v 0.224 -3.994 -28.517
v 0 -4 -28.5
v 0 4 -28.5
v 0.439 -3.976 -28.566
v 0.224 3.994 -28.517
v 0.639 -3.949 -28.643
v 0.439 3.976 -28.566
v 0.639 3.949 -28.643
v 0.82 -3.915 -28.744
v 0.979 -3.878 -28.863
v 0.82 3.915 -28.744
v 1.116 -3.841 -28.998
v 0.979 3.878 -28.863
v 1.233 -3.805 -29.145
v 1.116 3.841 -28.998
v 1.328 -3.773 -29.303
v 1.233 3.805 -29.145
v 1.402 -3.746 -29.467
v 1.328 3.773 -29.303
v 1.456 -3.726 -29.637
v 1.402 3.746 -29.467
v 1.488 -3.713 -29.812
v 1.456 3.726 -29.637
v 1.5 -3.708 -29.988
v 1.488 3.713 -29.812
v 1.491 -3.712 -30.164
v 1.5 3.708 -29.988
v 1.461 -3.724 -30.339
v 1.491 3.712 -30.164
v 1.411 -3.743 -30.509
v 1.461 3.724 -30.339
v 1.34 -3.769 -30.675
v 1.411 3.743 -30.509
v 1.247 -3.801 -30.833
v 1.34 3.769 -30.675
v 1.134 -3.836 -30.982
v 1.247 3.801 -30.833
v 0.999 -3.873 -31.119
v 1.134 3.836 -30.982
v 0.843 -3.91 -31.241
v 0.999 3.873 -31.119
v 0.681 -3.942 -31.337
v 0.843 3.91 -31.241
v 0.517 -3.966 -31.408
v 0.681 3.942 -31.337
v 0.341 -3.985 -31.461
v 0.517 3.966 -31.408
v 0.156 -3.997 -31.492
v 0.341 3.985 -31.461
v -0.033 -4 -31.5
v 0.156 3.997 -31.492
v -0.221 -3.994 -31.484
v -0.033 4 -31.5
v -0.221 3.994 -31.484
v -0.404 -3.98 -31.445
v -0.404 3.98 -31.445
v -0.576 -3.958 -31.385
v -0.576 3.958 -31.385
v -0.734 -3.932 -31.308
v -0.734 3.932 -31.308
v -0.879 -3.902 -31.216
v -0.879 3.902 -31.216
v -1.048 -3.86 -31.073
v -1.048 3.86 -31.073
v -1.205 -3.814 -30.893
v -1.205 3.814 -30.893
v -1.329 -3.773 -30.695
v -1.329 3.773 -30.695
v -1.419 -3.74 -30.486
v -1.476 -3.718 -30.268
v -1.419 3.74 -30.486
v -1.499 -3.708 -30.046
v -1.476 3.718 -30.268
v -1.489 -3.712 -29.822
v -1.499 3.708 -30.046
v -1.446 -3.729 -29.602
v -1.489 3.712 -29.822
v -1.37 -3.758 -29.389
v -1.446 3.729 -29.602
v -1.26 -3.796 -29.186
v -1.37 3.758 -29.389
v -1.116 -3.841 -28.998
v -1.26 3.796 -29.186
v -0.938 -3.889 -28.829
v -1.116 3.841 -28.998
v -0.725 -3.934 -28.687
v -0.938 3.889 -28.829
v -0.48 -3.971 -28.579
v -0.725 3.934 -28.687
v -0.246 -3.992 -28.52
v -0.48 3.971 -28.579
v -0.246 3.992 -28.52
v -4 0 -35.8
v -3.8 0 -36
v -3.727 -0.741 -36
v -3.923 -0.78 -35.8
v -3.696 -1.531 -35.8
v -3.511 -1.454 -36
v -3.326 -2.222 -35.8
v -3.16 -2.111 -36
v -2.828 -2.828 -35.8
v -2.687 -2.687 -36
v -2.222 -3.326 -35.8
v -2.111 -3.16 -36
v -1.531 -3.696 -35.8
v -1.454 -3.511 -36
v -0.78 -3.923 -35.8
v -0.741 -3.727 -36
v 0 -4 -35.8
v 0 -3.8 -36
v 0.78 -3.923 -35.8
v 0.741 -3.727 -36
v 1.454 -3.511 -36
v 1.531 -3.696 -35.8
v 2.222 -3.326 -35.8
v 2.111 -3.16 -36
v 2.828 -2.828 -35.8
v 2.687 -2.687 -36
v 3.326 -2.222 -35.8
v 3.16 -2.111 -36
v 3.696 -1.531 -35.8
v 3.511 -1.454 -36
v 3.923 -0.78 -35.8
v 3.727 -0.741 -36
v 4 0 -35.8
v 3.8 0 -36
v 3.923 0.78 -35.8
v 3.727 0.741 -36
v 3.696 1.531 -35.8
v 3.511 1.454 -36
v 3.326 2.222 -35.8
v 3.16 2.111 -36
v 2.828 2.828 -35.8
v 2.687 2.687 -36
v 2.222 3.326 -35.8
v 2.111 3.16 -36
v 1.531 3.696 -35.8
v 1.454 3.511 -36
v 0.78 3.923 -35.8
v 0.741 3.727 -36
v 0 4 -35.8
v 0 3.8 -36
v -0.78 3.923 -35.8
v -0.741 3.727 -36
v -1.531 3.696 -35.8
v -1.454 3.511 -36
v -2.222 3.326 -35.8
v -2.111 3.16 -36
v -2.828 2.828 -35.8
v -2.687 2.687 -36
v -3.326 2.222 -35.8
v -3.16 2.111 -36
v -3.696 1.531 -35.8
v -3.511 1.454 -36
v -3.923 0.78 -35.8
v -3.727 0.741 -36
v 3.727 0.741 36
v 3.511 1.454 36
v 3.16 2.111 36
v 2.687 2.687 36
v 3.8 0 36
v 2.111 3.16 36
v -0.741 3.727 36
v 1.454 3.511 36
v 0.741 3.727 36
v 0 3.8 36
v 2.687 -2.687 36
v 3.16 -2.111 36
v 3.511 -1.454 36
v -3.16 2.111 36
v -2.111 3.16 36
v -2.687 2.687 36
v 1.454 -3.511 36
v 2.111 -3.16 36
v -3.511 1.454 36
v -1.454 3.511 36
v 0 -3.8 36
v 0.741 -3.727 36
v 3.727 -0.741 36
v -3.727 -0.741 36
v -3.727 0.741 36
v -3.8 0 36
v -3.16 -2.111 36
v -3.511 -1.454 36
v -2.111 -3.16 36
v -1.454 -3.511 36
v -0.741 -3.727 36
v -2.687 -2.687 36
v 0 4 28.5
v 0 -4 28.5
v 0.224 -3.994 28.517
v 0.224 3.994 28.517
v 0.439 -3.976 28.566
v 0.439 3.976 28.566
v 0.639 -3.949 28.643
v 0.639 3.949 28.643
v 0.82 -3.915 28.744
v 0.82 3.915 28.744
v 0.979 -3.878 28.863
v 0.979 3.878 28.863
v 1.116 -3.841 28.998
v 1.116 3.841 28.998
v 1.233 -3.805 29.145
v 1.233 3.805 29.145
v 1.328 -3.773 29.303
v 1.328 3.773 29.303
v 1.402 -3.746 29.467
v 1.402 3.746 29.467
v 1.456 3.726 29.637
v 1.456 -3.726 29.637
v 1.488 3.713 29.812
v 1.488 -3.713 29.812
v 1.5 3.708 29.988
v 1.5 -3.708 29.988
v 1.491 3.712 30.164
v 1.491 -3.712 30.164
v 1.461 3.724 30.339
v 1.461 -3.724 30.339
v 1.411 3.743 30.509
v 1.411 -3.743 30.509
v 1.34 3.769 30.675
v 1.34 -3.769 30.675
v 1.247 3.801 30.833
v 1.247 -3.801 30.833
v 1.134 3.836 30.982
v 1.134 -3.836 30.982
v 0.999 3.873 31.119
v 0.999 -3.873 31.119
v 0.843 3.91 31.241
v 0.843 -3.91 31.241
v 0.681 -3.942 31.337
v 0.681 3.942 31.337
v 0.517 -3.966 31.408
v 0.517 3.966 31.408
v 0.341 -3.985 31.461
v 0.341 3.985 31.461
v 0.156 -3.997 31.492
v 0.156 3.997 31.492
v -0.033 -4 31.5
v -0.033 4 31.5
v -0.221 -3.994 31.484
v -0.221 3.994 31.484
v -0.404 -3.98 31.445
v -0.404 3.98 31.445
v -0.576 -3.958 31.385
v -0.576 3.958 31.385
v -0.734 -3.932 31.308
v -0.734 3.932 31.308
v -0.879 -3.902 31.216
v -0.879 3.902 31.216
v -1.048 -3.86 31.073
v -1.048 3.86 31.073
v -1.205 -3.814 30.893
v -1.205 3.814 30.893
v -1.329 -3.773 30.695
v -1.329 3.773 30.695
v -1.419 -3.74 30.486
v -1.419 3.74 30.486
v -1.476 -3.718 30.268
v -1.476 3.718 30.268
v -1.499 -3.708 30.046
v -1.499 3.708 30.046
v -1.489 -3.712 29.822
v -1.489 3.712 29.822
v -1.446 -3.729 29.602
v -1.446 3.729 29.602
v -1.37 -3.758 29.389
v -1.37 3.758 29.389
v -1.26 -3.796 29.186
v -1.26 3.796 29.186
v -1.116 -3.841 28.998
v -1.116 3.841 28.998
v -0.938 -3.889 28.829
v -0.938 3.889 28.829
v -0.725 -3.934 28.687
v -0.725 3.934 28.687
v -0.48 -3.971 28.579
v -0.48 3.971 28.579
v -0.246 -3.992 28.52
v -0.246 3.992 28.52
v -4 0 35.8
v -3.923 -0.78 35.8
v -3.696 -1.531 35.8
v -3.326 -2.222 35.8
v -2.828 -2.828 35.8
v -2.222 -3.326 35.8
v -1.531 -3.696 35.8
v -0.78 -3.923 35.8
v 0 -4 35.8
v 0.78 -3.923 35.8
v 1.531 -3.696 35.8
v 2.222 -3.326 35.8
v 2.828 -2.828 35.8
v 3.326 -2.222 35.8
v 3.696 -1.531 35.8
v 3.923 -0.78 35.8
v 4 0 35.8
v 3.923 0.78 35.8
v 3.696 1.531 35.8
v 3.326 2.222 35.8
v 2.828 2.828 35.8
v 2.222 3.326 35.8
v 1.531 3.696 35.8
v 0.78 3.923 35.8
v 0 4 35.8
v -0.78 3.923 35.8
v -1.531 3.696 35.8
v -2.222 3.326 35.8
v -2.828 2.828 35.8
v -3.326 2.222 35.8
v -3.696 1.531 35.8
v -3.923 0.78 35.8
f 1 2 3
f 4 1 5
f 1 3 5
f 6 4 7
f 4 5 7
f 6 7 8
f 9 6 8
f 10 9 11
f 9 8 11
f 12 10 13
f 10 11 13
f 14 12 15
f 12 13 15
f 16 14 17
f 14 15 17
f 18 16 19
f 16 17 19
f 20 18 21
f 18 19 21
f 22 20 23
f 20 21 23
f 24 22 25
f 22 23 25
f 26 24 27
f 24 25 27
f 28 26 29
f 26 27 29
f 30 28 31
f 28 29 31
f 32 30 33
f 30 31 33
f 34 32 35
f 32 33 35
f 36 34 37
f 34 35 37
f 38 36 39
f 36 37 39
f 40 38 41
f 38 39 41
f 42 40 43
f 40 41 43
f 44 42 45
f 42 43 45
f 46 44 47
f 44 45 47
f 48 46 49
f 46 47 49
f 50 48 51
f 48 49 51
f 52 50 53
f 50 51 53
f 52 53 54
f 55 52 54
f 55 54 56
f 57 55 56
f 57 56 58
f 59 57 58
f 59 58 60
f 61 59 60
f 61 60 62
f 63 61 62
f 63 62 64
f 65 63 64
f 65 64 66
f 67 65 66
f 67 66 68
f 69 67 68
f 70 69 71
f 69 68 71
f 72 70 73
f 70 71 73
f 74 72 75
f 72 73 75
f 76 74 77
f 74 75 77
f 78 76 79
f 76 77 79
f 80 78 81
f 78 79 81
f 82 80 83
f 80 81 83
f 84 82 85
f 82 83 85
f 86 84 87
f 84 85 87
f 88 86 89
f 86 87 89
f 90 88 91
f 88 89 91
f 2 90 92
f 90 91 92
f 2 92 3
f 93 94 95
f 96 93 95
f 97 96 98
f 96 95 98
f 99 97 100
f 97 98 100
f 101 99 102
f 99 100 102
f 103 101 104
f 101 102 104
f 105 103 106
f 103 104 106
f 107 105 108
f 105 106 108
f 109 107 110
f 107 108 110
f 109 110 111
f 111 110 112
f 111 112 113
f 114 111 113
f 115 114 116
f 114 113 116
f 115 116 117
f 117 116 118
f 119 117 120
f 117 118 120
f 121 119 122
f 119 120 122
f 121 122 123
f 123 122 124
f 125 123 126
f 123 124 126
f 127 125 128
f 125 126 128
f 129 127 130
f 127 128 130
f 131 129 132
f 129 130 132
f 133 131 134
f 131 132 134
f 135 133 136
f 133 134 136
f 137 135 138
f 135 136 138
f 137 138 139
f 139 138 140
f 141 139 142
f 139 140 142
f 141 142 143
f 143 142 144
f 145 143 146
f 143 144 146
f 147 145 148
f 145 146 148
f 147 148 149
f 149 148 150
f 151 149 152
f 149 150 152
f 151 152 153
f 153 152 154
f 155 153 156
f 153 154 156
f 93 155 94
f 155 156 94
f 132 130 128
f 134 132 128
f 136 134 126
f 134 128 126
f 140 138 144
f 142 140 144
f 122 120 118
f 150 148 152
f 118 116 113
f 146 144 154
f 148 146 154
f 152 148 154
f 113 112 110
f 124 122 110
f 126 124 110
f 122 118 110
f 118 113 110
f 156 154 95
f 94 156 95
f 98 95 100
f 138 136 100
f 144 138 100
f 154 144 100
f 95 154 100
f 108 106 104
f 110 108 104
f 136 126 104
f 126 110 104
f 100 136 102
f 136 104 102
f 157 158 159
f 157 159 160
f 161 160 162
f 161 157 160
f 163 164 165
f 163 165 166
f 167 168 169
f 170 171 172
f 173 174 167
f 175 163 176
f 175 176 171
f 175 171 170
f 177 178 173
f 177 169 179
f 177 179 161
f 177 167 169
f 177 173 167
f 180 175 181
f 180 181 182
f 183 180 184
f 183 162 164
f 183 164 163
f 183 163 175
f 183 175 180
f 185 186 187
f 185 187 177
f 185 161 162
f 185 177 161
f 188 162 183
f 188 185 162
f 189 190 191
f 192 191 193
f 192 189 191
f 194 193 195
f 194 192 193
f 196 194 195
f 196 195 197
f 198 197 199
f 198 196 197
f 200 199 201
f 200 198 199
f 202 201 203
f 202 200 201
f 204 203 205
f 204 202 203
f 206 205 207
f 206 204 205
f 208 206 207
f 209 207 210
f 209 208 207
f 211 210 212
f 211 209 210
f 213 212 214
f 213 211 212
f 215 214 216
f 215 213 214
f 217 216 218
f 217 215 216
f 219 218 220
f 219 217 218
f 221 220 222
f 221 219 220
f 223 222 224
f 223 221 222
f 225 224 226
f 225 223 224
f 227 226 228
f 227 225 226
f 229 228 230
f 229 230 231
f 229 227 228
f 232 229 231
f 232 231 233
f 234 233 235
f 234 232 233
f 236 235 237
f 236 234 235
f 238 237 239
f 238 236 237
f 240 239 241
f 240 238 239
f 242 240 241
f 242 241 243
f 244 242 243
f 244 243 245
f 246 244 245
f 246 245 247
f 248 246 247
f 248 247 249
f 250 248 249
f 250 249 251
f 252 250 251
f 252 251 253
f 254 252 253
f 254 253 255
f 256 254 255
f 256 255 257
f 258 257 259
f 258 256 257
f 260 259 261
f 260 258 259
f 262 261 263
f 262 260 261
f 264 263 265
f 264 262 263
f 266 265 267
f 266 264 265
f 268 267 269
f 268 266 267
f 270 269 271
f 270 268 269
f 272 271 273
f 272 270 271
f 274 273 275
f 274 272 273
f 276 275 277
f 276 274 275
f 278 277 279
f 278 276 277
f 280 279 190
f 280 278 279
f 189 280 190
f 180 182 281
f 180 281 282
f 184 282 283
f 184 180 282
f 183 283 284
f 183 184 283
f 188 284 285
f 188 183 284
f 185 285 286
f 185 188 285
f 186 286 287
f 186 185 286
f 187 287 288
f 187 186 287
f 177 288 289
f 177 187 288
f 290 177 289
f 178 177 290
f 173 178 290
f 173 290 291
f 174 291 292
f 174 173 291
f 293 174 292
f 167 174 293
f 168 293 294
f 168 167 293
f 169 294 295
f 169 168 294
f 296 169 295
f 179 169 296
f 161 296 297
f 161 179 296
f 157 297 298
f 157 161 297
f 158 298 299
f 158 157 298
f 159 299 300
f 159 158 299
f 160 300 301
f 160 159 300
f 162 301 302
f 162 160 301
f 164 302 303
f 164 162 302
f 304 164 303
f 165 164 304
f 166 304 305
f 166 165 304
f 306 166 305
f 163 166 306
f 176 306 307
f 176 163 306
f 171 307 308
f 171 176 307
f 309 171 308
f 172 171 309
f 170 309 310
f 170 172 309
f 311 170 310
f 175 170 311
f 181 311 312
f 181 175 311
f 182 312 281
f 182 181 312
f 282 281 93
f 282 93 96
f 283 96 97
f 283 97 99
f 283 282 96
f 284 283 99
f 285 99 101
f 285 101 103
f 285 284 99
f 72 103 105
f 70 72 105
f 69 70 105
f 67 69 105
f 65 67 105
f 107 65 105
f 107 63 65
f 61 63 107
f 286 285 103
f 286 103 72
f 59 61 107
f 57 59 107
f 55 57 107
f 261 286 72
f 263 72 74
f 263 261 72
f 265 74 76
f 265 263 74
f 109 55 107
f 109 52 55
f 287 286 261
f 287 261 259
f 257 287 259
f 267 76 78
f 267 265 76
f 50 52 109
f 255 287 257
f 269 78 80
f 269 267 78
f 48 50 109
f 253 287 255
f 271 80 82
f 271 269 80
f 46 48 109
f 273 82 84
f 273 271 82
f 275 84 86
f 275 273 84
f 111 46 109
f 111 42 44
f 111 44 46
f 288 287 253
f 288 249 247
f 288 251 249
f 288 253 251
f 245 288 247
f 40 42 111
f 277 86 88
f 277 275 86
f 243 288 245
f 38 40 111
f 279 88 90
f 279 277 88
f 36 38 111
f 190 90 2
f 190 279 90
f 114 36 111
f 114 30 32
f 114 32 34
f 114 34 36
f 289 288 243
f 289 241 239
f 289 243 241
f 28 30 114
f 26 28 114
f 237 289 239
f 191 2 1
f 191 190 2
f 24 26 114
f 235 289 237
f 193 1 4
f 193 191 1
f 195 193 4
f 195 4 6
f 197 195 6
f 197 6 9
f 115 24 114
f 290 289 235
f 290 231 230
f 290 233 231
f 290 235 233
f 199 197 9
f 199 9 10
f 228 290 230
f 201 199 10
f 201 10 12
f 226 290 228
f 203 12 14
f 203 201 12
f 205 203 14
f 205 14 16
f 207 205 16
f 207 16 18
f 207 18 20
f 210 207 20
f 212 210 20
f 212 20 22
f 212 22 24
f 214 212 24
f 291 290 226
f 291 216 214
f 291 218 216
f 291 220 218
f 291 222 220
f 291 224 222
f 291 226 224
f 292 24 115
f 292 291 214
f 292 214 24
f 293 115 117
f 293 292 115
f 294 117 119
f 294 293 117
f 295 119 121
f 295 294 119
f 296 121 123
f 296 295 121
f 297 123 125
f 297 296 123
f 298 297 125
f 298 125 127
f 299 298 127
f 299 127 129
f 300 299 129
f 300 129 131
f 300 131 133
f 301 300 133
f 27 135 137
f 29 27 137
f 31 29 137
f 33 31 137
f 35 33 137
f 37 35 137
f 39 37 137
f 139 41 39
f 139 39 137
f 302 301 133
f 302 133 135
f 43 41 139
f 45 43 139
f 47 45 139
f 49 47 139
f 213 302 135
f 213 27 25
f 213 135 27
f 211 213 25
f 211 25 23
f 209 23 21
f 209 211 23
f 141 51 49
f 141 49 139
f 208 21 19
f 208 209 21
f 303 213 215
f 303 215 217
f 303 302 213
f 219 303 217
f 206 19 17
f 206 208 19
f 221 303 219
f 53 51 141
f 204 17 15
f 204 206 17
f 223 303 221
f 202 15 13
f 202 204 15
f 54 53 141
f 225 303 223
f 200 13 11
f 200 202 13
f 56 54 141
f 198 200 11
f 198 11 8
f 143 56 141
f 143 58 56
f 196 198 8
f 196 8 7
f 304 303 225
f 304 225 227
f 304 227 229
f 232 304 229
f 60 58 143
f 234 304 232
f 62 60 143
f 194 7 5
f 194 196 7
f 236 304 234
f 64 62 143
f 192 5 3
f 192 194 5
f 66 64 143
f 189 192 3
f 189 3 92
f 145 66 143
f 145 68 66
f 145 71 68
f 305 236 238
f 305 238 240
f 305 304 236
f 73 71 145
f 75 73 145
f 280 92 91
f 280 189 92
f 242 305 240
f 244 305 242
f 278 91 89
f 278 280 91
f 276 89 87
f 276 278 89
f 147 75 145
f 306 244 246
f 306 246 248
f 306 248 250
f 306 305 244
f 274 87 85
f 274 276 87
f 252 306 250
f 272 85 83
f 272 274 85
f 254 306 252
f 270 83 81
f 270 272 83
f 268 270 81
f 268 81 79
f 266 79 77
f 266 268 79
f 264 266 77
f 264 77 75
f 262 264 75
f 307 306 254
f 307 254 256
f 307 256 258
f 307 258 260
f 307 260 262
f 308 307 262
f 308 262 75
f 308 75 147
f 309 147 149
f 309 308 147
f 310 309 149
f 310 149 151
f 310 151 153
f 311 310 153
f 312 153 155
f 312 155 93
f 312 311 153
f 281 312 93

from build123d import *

# Parameters (mm, degrees)
SKETCH_1_R          = 4
EXTRUDE_1_DEPTH     = 26
SKETCH_2_R          = 4
EXTRUDE_2_DEPTH     = 36
SKETCH_3_R          = 1.5
CUT_EXTRUDE_1_DEPTH = 37.441734317
CHAMFER_1_SIZE      = 0.2


with BuildPart() as part:
    # ｽｹｯﾁ1 → ﾎﾞｽ - 押し出し1 (new, symmetric)
    with BuildSketch(Plane.XY):
        with Locations(Location((0, 0, 0), (0, 0, 180))):
            Circle(SKETCH_1_R)
    extrude(amount=EXTRUDE_1_DEPTH, both=True)

    # ｽｹｯﾁ2 → ﾎﾞｽ - 押し出し2 (add, symmetric)
    with BuildSketch(Plane.XY):
        with Locations(Location((0, 0, 0), (0, 0, 180))):
            Circle(SKETCH_2_R)
    extrude(amount=EXTRUDE_2_DEPTH, both=True)

    # ｽｹｯﾁ3 → ｶｯﾄ - 押し出し1 (cut, symmetric)
    with BuildSketch(Plane(origin=(0, 0, 0), x_dir=(1, 0, 0), z_dir=(0, 1, 0))):
        with Locations(Location((0, 30, 0), (0, 0, 270))):
            Circle(SKETCH_3_R)
    cut_extrude_1 = extrude(amount=CUT_EXTRUDE_1_DEPTH, both=True, mode=Mode.SUBTRACT)

    # ﾐﾗｰ1: ｶｯﾄ - 押し出し1 across plane
    add(cut_extrude_1.mirror(Plane.XY), mode=Mode.SUBTRACT)

    # 面取り1
    chamfer_1_edges = [part.edges().sort_by_distance(p)[0] for p in [
        (4, 0, -36),
        (4, 0, 36),
    ]]
    chamfer(chamfer_1_edges, length=CHAMFER_1_SIZE)


solid = part.part
